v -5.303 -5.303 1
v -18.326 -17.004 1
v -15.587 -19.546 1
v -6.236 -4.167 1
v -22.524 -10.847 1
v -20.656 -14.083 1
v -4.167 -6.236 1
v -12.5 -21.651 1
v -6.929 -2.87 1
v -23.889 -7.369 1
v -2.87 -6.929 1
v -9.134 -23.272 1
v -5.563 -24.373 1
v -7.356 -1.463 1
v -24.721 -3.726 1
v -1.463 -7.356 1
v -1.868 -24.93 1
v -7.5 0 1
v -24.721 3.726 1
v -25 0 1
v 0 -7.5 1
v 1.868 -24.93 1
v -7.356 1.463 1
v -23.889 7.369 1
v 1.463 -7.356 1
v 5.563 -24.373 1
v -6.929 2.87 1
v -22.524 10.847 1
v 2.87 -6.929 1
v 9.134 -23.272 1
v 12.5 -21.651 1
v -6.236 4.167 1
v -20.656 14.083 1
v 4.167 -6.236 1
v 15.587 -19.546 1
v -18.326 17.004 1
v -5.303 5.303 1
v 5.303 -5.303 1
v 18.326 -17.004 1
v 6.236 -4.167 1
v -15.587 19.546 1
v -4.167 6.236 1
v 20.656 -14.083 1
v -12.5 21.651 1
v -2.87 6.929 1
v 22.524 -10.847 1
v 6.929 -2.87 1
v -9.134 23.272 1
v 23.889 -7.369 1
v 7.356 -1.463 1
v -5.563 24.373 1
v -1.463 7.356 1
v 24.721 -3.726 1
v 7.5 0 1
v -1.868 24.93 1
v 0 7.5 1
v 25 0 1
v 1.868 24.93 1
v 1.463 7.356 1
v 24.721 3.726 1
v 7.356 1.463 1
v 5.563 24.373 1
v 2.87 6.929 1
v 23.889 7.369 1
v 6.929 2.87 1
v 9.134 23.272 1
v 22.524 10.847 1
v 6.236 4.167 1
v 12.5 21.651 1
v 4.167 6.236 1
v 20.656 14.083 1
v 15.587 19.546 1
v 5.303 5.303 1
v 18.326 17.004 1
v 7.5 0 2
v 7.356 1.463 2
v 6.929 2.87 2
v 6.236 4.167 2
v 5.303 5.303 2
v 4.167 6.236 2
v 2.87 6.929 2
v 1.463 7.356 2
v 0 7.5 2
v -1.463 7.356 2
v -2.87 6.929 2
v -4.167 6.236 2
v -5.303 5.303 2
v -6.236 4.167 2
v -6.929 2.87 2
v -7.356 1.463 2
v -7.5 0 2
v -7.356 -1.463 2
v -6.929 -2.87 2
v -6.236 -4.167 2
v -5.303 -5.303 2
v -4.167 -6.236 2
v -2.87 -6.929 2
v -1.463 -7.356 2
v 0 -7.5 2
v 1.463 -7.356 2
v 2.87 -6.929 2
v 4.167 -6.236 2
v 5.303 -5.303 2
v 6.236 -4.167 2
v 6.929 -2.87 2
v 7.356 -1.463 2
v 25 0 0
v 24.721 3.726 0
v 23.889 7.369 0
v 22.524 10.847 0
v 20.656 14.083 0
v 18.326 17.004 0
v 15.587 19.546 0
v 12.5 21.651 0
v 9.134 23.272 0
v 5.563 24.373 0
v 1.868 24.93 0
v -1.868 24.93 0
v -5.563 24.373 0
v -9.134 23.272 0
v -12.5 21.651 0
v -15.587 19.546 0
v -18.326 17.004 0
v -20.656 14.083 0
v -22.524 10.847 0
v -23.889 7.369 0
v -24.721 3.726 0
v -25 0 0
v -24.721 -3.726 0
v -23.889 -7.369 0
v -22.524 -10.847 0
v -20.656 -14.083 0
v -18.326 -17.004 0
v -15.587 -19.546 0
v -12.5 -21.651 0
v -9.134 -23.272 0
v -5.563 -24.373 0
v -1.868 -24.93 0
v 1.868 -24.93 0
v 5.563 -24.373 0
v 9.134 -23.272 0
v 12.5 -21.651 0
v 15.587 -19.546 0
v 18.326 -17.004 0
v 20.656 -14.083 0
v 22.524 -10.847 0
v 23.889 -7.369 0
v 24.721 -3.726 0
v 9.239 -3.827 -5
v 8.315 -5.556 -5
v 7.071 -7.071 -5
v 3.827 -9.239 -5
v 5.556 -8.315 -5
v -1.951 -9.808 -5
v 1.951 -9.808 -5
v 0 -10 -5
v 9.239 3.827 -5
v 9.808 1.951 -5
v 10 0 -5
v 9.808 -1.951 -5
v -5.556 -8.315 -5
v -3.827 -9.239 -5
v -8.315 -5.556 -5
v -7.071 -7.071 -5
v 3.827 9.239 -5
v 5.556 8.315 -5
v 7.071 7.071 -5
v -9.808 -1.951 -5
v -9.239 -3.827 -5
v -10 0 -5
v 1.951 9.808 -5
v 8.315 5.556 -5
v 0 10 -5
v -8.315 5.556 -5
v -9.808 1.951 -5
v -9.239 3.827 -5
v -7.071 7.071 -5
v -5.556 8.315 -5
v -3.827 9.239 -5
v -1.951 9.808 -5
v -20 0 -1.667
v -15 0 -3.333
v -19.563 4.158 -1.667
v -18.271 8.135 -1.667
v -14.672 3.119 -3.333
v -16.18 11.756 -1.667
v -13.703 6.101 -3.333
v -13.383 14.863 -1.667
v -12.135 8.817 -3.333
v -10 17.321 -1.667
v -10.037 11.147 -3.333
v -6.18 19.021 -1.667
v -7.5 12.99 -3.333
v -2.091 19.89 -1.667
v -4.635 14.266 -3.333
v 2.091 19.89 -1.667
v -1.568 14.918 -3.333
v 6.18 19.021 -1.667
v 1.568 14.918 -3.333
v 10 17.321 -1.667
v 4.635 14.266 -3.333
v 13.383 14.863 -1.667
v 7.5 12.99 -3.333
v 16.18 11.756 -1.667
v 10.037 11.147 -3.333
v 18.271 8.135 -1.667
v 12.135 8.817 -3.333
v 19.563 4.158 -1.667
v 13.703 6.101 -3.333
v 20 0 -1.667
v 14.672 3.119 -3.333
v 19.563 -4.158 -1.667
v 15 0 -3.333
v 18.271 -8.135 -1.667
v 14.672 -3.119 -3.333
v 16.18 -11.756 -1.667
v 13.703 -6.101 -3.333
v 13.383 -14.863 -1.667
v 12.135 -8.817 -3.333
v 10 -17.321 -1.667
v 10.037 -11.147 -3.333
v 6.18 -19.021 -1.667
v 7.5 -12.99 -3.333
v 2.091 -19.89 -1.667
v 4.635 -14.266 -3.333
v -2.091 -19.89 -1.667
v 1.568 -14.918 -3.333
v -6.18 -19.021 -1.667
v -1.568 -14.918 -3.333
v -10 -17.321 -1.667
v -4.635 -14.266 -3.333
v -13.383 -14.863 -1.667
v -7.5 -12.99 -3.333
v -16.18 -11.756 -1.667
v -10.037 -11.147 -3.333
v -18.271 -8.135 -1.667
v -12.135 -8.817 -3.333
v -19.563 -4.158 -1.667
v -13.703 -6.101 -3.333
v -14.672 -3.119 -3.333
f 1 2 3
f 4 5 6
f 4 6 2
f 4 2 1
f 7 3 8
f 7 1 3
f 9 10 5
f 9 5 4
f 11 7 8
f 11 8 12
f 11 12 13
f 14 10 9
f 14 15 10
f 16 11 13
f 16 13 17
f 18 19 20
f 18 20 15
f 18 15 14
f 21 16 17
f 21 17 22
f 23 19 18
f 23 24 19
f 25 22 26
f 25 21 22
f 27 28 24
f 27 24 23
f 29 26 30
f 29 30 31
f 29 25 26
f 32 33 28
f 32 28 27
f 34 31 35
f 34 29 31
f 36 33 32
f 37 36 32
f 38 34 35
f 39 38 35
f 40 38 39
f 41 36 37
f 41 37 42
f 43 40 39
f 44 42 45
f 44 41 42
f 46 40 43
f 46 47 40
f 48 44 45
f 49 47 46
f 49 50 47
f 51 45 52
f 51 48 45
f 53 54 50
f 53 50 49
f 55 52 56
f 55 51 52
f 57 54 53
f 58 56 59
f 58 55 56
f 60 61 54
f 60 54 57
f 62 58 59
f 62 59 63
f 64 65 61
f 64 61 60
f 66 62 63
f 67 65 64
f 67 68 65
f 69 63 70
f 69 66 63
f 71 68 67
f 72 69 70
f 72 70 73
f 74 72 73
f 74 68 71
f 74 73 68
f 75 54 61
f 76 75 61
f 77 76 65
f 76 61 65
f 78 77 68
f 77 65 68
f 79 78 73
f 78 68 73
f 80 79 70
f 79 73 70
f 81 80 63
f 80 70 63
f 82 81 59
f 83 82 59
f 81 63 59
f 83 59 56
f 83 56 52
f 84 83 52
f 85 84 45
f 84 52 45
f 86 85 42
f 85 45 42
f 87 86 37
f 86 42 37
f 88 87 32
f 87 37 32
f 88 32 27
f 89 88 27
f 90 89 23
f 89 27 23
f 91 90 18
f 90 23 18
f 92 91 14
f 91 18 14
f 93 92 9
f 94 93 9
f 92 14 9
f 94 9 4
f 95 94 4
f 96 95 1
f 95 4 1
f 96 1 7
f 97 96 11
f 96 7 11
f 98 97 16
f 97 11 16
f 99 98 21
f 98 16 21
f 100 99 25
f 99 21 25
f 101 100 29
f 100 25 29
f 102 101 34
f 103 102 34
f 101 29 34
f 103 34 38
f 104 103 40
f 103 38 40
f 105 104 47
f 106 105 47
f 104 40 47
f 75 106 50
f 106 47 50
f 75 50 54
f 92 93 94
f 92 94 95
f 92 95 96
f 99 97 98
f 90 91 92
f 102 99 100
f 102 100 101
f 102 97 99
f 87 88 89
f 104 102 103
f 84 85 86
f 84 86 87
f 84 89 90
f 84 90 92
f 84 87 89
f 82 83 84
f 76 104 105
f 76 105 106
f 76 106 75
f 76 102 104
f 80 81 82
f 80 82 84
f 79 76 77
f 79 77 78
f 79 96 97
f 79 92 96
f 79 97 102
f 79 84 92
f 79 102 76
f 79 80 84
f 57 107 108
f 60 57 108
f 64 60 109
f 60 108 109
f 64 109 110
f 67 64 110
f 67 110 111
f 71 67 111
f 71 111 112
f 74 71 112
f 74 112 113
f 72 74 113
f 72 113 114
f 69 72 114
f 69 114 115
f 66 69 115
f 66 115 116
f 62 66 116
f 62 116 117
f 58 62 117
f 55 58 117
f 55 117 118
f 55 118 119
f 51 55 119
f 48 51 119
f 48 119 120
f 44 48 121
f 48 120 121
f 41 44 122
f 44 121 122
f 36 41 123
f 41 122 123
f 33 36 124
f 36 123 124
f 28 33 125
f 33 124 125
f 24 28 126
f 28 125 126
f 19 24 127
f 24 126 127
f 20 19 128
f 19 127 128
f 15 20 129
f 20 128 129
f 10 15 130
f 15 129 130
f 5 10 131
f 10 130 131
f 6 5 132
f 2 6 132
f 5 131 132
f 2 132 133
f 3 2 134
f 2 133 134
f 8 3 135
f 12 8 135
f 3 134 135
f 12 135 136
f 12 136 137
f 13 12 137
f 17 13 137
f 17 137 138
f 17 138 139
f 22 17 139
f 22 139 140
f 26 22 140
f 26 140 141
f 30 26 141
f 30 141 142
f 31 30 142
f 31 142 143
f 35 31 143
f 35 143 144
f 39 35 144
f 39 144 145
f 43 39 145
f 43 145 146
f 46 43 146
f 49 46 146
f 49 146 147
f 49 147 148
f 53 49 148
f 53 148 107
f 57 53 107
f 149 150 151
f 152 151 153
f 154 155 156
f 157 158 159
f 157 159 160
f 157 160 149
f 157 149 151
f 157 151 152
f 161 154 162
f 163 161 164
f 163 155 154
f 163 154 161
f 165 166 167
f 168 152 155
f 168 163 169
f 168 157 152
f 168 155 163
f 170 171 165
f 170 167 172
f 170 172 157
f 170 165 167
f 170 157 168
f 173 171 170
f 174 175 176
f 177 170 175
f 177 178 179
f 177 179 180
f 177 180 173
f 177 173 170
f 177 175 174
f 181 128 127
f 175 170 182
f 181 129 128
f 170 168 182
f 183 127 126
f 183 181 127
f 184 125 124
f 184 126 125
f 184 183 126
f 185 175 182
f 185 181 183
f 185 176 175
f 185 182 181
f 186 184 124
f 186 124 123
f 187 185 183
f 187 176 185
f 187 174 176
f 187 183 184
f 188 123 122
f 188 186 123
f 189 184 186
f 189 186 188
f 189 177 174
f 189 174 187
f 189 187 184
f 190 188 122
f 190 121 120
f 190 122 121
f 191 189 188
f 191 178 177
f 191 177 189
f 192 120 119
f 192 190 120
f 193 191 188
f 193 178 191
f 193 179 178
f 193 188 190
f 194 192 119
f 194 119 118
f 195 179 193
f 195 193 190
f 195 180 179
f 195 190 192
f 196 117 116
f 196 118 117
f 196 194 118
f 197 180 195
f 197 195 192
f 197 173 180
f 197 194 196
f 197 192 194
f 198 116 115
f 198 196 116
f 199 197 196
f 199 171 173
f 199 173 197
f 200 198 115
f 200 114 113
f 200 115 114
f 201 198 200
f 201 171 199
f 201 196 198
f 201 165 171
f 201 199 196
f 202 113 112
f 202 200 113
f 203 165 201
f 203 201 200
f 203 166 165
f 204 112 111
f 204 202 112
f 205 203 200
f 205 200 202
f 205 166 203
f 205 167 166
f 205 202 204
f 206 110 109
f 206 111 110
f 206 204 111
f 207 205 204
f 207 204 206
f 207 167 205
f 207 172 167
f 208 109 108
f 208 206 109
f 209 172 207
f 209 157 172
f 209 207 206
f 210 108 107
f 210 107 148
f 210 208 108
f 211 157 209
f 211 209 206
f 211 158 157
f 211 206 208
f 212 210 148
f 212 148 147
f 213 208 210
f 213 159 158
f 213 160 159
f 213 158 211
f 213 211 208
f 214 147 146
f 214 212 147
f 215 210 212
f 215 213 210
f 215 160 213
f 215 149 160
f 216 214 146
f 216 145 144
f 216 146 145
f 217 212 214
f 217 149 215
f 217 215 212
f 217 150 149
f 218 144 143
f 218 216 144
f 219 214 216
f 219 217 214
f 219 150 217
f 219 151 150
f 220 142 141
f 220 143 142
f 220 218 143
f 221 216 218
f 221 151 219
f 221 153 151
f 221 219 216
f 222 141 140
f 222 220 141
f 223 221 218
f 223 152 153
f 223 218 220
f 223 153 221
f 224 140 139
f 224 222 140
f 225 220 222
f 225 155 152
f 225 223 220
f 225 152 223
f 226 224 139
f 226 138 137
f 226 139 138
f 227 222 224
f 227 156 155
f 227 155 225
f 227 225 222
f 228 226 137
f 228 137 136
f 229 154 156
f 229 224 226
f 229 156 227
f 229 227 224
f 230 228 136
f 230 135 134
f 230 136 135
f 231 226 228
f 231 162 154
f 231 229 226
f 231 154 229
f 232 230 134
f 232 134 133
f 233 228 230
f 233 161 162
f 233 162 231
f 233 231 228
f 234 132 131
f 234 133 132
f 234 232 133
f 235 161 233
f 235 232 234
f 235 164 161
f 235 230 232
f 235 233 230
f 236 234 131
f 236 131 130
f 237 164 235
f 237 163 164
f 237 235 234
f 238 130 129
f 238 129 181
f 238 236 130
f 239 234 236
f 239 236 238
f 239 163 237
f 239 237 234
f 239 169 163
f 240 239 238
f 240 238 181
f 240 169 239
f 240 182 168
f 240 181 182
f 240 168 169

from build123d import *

# Parameters (mm, degrees)
SKETCH_1_R      = 25
EXTRUDE_1_DEPTH = 1
SKETCH_3_R      = 25
SKETCH_2_R      = 10
SKETCH_4_R      = 7.5
EXTRUDE_2_DEPTH = 1


with BuildPart() as part:
    # 草图1 → 凸台-拉伸1 (new body)
    with BuildSketch(Plane.XY):
        Circle(SKETCH_1_R)
    extrude(amount=EXTRUDE_1_DEPTH)

    # 草图3 → 放样1 section 0
    with BuildSketch(Plane(origin=(0, 0, 0), x_dir=(-1, 0, 0), z_dir=(0, 0, -1))):
        Circle(SKETCH_3_R)
    # 草图2 → 放样1 section 1
    with BuildSketch(Plane(origin=(0, 0, -5), x_dir=(-1, 0, 0), z_dir=(0, 0, -1))):
        Circle(SKETCH_2_R)
    loft()

    # 草图4 → 凸台-拉伸2 (add)
    with BuildSketch(Plane.XY.offset(1)):
        Circle(SKETCH_4_R)
    extrude(amount=EXTRUDE_2_DEPTH)


solid = part.part
